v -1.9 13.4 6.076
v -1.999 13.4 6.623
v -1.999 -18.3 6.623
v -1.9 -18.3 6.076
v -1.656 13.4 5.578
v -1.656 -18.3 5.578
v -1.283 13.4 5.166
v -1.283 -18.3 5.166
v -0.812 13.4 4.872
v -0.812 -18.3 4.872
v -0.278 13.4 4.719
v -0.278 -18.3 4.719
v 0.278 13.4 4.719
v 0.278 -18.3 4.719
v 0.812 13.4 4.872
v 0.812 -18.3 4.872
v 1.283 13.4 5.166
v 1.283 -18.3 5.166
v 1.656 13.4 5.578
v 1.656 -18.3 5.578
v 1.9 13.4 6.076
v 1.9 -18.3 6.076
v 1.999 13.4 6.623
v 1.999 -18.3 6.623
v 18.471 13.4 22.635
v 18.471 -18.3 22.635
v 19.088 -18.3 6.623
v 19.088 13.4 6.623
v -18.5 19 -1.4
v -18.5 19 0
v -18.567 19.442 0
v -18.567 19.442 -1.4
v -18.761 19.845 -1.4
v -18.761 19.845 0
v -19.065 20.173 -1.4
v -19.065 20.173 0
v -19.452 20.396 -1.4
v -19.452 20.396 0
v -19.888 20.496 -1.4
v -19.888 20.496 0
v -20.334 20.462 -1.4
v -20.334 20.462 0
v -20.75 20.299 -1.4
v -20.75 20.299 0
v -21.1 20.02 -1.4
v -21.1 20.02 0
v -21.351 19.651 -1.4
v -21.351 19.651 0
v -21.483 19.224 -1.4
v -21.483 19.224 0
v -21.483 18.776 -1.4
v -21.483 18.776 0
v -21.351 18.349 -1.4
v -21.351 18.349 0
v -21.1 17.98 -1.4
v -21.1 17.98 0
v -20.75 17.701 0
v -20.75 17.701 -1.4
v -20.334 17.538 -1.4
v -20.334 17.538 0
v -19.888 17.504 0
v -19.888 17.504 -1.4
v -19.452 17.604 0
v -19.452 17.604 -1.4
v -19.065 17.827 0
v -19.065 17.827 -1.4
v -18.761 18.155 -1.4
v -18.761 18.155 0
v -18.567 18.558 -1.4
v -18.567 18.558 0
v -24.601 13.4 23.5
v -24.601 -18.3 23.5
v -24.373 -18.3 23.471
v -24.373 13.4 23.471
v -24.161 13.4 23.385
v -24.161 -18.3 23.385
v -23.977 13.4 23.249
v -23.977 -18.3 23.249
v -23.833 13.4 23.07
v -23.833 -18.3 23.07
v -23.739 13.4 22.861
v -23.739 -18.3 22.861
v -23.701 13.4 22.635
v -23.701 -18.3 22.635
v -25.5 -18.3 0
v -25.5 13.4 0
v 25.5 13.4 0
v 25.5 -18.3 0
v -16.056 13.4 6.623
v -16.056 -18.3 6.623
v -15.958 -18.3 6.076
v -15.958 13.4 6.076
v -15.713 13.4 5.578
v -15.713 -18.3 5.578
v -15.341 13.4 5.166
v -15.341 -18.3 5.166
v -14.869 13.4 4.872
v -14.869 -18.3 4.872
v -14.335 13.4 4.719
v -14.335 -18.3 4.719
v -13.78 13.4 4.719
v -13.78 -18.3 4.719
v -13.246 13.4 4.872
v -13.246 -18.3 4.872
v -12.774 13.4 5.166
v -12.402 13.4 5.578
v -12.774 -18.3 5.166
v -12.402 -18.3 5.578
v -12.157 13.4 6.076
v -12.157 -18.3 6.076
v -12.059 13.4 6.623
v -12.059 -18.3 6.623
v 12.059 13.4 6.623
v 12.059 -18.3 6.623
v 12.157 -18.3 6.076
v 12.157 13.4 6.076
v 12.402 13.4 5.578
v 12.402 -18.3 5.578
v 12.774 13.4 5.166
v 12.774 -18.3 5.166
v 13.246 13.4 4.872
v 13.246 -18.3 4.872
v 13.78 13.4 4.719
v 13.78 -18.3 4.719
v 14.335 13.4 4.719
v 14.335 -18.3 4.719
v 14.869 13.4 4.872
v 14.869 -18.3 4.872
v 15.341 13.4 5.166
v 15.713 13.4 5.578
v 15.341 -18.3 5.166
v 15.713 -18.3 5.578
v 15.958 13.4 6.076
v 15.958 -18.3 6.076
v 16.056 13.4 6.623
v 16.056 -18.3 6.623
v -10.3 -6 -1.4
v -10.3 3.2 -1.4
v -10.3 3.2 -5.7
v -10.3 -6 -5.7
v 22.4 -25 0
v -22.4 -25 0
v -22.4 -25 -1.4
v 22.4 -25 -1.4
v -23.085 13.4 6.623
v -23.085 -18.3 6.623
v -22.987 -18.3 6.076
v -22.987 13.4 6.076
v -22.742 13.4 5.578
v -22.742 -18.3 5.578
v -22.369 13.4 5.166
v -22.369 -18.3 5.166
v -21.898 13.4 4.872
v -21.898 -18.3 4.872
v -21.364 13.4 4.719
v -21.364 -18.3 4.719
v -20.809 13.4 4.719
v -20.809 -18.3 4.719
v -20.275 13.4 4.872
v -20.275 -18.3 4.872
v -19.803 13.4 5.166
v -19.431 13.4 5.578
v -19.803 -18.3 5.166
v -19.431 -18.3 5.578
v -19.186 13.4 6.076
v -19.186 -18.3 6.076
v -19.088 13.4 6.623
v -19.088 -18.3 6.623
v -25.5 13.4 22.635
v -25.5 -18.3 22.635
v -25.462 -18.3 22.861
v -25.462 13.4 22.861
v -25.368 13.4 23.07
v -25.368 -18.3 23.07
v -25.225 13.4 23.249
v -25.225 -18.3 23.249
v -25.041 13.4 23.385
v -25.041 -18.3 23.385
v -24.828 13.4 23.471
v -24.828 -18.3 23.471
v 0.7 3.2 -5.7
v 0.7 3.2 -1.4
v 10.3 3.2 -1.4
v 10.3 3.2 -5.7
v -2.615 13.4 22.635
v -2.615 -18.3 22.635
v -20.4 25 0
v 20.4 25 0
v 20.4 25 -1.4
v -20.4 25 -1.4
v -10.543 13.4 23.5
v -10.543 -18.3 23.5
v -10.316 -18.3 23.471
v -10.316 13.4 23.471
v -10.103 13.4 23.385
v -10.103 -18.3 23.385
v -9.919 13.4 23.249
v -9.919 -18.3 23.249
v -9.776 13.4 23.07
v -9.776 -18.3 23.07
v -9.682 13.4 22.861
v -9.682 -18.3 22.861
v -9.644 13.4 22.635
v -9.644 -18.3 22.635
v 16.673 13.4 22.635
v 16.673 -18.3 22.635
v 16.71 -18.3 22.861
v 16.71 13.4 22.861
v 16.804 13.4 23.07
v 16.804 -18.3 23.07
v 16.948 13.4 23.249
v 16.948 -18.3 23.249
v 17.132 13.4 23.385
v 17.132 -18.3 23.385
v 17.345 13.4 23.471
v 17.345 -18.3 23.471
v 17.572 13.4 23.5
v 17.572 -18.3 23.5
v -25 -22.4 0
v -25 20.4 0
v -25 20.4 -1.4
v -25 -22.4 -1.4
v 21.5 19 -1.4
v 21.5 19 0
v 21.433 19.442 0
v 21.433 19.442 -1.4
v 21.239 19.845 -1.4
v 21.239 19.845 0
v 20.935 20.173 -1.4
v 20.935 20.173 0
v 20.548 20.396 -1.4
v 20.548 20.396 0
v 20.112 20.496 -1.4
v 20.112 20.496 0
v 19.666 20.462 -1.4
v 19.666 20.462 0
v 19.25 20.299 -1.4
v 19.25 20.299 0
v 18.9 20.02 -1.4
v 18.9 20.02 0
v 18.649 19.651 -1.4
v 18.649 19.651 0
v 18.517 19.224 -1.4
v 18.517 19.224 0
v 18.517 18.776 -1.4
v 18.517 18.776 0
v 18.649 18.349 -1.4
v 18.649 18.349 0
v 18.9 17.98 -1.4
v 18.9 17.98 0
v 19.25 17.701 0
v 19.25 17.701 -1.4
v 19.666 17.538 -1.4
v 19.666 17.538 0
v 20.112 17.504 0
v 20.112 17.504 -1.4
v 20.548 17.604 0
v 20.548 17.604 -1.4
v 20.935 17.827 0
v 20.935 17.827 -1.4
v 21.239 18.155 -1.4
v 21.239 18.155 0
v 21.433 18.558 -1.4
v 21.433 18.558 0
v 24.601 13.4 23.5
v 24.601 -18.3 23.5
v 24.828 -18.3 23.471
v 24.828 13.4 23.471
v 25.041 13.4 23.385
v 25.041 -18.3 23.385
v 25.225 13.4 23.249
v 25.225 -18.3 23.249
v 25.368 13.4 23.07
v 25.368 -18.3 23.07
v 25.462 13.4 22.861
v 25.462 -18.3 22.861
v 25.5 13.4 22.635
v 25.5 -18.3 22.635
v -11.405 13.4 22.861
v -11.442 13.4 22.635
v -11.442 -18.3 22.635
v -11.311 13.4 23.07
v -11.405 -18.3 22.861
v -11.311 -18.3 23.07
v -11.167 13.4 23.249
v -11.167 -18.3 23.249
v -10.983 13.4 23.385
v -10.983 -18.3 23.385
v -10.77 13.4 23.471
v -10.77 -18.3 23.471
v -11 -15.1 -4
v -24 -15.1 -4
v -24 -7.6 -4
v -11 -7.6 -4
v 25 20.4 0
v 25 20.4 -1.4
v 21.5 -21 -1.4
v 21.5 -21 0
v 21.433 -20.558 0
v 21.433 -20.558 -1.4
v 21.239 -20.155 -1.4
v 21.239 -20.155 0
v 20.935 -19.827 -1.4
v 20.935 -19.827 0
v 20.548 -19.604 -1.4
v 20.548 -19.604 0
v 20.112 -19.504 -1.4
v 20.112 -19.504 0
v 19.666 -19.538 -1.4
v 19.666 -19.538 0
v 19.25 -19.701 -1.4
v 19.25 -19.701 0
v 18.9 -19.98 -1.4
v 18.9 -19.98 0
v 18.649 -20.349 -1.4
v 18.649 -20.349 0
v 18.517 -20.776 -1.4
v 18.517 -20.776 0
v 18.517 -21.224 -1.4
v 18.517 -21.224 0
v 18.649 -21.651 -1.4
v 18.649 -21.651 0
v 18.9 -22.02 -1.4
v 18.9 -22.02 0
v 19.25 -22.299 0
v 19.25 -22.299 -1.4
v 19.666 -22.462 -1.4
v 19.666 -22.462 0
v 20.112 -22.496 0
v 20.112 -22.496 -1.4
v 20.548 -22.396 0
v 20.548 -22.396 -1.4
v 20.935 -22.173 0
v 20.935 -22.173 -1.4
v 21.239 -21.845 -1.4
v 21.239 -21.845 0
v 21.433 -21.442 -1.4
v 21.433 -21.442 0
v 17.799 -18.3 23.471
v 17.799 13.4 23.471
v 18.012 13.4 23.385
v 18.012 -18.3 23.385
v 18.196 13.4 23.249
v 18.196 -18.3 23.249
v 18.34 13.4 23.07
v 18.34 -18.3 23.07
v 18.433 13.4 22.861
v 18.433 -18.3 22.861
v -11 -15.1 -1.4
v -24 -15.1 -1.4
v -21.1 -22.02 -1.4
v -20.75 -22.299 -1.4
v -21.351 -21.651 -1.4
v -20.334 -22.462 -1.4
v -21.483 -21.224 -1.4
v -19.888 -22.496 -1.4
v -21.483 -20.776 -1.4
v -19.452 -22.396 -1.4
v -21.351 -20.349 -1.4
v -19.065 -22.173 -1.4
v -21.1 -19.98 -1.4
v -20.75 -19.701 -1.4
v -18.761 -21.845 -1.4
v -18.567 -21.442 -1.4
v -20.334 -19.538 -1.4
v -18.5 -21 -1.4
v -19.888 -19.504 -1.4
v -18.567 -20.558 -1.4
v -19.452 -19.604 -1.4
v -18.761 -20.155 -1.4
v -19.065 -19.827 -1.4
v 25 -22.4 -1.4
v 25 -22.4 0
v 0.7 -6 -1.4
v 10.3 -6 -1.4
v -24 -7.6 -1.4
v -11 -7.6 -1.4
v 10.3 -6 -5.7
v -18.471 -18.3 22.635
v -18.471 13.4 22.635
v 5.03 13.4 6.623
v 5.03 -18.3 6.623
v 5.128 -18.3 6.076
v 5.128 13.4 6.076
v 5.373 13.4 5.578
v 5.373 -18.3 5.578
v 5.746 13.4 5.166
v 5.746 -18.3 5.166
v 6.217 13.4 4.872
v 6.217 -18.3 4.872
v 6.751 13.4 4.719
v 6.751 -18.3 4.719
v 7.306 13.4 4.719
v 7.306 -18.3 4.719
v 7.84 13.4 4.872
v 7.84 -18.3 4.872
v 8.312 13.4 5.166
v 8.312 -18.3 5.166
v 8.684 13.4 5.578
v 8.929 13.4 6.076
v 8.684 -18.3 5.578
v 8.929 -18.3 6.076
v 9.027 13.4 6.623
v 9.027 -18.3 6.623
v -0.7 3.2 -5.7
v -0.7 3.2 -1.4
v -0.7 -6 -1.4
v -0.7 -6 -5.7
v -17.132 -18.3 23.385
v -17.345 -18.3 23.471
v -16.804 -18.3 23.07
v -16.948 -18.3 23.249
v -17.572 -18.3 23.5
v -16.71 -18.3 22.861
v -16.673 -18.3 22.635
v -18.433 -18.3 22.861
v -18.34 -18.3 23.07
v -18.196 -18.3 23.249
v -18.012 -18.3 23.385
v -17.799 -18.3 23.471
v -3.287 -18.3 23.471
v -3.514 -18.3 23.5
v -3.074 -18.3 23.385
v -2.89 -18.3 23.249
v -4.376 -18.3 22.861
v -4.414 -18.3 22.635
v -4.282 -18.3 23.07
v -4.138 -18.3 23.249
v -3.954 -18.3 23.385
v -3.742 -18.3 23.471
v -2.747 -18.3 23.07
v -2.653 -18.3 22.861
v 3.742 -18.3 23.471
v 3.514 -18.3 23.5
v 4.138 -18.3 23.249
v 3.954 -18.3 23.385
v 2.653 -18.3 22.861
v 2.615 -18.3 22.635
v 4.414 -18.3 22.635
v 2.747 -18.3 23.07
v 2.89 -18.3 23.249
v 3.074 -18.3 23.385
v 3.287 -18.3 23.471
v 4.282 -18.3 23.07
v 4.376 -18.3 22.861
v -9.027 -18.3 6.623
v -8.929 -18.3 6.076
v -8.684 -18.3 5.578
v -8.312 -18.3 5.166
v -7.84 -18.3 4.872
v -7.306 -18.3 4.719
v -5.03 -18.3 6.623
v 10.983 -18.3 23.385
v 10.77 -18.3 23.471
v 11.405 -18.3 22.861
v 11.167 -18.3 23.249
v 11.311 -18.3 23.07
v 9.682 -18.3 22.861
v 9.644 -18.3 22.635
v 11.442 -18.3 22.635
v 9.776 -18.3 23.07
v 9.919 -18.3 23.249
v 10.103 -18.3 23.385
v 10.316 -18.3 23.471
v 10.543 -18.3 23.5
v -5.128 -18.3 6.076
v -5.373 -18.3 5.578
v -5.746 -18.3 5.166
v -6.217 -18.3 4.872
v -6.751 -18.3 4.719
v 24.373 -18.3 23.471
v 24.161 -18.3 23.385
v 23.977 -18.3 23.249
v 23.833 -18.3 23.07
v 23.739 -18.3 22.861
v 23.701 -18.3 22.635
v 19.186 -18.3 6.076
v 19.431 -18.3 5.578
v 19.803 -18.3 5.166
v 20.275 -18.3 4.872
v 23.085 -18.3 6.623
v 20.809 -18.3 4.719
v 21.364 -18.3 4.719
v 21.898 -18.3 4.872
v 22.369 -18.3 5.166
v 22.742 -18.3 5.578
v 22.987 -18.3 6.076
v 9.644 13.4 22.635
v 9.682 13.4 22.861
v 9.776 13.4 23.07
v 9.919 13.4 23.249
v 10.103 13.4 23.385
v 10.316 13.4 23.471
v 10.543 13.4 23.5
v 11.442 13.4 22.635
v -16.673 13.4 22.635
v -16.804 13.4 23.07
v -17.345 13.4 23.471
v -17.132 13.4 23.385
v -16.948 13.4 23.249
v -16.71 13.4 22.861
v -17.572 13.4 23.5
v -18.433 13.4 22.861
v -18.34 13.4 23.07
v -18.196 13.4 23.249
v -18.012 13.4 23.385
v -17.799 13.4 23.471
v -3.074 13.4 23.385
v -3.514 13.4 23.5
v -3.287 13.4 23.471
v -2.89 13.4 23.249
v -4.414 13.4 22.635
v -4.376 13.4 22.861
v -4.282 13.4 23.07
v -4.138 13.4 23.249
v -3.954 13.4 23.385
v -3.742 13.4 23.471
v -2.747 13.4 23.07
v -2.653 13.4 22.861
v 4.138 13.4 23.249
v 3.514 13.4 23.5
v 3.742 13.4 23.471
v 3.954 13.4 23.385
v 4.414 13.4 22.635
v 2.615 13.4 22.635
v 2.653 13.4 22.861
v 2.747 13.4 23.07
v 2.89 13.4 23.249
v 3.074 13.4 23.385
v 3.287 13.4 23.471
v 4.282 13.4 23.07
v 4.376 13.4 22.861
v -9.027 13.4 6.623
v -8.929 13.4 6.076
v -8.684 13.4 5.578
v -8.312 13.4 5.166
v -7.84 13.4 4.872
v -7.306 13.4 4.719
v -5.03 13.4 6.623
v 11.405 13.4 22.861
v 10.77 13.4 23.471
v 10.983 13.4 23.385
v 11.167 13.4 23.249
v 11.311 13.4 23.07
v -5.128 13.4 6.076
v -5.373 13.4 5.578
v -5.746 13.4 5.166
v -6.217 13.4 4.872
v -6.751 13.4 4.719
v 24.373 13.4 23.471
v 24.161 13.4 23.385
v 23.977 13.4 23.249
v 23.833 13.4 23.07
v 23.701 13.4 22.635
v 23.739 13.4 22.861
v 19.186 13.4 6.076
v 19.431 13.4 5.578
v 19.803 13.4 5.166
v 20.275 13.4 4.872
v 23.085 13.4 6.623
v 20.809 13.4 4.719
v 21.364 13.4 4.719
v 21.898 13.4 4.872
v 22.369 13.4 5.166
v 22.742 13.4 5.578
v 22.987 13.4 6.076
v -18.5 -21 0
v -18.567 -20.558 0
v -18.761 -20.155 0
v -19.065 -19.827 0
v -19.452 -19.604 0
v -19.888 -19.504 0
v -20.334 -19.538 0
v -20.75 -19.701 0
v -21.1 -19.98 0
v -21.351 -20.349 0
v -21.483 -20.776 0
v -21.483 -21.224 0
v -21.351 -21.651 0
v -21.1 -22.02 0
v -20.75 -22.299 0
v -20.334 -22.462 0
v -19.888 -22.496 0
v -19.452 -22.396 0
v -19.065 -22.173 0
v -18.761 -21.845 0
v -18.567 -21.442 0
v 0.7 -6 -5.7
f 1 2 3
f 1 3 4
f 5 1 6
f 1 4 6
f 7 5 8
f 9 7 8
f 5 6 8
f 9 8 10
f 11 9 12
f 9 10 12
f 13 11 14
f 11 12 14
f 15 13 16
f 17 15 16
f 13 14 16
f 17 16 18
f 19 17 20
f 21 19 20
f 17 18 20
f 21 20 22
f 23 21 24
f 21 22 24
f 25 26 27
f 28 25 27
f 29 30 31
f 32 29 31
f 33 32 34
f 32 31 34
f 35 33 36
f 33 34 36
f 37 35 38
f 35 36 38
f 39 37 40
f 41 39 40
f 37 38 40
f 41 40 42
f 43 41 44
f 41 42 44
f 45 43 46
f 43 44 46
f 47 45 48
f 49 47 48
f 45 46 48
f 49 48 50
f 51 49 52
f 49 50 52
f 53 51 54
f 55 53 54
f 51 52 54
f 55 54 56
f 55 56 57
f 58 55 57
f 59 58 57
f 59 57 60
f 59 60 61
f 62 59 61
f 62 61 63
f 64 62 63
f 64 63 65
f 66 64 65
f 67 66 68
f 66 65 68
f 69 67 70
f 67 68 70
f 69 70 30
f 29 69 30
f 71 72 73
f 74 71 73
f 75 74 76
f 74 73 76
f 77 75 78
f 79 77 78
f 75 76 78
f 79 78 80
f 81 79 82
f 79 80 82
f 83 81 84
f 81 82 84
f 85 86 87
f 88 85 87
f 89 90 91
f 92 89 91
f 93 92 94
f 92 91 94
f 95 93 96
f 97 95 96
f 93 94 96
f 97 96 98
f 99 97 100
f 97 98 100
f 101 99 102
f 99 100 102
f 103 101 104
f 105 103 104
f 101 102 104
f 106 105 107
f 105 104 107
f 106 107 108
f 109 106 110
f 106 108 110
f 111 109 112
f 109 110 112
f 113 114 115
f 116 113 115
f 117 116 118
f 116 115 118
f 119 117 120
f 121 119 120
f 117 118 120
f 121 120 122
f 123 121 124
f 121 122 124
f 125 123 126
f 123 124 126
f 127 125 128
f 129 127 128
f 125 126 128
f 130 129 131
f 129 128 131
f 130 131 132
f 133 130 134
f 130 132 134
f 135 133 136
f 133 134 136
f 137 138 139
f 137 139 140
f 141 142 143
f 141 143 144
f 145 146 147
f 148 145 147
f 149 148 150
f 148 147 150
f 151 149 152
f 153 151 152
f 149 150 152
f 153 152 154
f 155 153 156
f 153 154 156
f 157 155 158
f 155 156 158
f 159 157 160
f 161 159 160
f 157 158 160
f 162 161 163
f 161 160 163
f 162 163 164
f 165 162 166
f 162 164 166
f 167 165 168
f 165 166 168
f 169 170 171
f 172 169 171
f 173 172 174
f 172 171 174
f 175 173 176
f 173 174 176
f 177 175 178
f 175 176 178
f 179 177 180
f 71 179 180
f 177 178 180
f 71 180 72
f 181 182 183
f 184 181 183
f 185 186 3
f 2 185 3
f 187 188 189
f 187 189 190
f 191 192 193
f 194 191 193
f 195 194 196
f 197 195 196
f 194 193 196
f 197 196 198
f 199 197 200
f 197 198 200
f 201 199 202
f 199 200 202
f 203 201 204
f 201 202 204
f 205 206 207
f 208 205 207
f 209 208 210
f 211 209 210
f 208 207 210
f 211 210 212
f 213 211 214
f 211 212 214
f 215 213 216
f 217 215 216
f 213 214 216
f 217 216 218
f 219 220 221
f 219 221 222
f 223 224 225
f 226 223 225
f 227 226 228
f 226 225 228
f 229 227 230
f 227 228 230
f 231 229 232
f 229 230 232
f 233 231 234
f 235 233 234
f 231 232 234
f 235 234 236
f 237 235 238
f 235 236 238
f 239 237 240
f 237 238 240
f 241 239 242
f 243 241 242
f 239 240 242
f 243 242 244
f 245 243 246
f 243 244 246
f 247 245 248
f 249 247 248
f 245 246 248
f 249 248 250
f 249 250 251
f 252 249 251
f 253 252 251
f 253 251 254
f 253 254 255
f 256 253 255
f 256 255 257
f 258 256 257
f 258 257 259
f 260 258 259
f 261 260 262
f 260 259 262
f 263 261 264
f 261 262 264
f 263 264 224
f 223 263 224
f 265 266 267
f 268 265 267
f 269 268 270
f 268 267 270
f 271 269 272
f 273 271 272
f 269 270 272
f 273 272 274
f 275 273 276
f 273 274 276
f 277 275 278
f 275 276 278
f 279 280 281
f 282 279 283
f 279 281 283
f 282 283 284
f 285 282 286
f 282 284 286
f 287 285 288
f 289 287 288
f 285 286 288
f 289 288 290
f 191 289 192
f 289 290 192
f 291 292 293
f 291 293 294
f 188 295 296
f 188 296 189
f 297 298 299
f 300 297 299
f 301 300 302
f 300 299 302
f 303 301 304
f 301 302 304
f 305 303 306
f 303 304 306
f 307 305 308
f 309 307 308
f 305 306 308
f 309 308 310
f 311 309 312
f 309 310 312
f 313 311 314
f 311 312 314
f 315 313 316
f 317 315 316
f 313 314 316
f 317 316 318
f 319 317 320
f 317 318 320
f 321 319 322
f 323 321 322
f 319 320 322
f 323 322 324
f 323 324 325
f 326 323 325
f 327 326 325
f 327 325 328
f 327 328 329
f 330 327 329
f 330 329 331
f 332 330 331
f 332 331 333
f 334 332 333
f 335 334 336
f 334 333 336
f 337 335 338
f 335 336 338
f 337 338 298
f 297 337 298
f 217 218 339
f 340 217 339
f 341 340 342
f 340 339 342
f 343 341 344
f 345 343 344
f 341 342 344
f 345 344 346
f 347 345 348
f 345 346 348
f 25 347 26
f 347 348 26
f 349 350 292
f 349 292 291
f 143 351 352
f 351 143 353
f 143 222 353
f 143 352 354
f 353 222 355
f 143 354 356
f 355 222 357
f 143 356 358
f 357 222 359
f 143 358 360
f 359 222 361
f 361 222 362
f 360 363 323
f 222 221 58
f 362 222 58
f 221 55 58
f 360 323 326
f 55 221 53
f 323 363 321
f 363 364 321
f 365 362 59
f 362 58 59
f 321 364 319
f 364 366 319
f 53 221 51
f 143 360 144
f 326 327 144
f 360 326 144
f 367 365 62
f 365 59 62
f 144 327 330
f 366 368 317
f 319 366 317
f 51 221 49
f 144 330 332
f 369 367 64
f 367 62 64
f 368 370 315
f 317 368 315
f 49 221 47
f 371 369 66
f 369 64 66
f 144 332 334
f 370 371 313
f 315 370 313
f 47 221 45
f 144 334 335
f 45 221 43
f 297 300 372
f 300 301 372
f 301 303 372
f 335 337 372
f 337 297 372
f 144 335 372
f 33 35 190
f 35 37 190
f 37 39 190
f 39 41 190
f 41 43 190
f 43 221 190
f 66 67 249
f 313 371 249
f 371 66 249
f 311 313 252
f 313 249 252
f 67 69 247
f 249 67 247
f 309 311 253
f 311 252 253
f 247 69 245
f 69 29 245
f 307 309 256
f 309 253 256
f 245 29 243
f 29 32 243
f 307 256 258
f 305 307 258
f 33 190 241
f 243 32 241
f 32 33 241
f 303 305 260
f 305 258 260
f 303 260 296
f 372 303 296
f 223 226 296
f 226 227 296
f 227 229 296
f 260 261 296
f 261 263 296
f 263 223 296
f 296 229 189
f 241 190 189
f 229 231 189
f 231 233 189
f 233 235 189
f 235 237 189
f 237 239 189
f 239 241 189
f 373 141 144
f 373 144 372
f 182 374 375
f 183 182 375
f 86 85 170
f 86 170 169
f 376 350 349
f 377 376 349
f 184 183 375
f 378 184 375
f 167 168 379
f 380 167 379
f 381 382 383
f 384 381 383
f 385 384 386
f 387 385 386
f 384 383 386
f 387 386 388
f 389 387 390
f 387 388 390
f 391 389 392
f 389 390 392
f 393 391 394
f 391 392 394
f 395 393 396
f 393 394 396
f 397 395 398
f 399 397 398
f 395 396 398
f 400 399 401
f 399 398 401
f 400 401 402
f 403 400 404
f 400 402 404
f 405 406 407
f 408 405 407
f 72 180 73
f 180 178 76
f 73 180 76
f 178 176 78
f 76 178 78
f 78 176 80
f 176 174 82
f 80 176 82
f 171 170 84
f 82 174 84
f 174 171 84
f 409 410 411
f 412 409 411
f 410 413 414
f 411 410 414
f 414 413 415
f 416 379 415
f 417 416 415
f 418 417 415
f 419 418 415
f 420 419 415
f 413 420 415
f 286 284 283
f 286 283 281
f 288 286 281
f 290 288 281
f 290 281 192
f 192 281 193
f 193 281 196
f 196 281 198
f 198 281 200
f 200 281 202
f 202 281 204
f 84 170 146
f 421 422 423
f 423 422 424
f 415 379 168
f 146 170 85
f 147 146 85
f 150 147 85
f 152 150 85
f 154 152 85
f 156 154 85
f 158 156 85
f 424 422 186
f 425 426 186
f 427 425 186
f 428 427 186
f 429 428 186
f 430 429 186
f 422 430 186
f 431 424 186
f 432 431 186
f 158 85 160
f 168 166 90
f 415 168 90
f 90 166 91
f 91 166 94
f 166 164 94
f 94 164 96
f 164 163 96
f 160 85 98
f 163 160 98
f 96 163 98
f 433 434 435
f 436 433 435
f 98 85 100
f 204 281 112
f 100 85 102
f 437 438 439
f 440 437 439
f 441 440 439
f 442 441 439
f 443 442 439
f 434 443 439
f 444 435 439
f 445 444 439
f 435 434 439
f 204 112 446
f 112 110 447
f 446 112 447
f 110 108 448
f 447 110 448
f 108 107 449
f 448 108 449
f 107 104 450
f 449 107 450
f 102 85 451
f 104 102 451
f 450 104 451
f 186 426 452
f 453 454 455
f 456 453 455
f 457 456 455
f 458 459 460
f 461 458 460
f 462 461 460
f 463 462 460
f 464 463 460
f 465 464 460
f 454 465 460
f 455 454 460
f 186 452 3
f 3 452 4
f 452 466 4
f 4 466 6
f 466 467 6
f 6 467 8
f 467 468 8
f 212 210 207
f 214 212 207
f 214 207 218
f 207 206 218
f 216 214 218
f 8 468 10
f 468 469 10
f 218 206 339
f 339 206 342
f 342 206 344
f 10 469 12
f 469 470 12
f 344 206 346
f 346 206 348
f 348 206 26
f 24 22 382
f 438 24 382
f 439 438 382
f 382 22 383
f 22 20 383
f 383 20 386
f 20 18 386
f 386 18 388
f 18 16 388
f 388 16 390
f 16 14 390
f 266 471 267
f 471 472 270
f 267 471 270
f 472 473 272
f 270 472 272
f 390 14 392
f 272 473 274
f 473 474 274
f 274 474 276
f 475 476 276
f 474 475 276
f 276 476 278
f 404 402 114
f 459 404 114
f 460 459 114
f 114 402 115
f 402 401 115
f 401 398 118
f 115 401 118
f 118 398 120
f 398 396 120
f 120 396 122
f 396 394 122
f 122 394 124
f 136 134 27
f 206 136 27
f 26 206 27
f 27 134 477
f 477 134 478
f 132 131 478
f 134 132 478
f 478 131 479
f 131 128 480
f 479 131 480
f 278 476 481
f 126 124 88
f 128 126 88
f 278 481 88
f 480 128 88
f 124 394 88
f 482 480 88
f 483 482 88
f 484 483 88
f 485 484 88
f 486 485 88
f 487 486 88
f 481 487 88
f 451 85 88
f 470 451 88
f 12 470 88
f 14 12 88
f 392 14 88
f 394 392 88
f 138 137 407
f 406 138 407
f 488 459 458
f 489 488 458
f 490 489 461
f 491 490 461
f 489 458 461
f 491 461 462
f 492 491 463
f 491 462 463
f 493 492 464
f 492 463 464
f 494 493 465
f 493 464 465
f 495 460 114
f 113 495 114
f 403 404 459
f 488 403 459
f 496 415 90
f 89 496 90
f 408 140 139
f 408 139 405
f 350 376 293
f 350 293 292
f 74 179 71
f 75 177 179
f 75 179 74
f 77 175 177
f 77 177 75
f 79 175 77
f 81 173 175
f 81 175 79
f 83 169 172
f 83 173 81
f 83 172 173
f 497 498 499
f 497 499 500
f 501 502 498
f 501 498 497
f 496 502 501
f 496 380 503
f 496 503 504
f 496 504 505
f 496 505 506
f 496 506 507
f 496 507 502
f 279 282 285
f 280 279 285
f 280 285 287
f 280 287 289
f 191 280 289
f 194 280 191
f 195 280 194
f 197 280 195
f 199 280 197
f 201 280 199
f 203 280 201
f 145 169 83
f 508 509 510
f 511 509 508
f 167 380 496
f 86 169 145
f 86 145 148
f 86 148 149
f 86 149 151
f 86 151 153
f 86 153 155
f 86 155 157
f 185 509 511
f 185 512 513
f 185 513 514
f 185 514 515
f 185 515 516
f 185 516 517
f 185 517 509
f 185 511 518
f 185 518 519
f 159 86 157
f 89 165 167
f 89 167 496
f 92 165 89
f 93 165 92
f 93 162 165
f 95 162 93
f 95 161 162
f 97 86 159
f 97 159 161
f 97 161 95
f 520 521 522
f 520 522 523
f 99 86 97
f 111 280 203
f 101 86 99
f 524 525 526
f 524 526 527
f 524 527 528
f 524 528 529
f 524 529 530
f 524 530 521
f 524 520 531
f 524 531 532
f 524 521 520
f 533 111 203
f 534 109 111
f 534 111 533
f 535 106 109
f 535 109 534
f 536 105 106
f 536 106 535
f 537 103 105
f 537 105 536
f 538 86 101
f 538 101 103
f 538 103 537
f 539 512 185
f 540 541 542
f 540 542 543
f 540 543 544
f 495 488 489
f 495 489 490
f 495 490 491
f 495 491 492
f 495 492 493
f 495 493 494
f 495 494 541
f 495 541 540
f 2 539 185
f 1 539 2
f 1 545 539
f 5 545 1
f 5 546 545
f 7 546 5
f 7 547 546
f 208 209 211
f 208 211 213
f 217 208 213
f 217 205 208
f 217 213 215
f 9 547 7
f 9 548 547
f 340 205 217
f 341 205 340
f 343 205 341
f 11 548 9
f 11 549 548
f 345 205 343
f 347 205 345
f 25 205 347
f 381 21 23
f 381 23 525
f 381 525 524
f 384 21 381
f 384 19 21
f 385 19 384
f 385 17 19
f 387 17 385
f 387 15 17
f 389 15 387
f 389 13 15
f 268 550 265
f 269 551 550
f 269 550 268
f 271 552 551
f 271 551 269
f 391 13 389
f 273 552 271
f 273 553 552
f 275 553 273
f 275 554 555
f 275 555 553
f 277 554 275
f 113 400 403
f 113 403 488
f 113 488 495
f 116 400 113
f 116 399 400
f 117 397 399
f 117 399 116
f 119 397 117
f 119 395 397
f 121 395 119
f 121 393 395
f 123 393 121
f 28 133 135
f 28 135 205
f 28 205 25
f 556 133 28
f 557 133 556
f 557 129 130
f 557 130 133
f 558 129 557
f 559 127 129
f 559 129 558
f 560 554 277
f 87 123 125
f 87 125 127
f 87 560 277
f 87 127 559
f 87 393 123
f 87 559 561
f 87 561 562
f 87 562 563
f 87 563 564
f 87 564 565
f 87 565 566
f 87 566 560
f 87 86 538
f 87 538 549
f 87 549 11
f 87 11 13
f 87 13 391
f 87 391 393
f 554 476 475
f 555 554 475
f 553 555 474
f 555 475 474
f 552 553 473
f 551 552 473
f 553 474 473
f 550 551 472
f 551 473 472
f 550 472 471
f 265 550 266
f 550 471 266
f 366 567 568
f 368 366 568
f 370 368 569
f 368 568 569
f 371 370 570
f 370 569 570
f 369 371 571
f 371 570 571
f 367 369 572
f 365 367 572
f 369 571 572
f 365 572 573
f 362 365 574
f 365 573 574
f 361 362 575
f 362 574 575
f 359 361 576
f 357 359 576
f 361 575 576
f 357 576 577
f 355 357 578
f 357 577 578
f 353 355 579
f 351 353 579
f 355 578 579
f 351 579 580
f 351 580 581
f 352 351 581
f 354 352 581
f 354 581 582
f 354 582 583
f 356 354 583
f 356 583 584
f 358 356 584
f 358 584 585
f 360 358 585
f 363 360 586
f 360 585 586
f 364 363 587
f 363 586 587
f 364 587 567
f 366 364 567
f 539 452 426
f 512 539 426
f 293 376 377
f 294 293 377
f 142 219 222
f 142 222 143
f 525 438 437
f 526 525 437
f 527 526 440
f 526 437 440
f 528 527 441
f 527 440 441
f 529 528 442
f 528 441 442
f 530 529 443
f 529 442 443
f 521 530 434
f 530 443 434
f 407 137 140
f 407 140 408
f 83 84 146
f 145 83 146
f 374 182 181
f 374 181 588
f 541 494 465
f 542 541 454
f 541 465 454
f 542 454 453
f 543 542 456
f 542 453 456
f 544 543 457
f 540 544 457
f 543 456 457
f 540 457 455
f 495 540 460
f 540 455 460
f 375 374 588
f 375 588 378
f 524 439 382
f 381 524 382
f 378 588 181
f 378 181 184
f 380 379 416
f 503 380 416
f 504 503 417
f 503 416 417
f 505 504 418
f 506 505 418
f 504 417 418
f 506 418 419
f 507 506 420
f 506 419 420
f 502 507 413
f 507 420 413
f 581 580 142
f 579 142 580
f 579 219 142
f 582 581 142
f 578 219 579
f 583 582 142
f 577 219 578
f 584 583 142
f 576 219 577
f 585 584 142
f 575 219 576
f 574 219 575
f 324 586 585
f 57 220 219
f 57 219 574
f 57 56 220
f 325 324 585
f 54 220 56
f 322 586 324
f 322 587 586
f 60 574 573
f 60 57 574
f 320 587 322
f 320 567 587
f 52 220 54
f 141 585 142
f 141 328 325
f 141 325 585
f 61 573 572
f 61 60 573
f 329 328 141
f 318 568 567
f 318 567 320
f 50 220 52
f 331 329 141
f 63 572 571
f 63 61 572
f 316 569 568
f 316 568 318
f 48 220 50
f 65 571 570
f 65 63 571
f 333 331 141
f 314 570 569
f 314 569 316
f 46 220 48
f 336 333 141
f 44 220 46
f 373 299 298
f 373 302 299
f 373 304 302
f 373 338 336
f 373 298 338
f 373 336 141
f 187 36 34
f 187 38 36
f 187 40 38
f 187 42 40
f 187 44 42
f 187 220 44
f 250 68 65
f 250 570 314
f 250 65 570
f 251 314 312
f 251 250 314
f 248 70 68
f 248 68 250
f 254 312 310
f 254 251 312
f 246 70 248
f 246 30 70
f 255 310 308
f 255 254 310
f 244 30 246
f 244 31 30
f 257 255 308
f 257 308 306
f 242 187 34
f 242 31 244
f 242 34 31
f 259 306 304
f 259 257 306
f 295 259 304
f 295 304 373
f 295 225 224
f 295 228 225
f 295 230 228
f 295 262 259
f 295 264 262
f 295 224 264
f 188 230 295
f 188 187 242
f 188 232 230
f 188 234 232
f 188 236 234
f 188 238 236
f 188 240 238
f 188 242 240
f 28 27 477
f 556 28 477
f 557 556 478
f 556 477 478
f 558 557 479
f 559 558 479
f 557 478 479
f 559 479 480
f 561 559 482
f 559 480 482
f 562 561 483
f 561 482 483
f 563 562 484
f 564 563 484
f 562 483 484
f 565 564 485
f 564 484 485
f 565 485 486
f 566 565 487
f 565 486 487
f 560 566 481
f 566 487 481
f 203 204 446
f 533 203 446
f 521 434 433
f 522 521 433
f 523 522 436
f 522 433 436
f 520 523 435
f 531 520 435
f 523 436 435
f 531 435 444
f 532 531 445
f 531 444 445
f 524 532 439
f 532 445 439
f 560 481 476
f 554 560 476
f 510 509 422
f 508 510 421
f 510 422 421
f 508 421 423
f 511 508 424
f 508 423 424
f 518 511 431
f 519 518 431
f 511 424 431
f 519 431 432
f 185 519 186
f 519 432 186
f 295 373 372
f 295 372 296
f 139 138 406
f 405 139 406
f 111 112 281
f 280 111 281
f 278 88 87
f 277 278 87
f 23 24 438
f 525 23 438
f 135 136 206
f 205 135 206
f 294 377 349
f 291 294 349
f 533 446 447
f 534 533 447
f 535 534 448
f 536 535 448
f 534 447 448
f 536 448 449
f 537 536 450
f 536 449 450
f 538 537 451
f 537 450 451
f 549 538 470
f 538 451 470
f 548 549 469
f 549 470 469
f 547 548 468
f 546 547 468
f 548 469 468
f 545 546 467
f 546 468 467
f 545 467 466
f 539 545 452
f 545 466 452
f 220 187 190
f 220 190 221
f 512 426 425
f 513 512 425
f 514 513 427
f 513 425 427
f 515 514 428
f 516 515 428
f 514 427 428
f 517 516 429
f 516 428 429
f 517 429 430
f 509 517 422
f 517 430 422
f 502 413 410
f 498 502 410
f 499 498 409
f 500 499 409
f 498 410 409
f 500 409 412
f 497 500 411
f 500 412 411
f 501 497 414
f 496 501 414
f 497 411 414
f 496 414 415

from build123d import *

# Parameters (mm, degrees)
F0_R     = 1.5
F1_DEPTH = 1.4
F2_W     = 51
F2_H     = 31.7
F3_DEPTH = 23.5
F5_DEPTH = 31.7
F6_W     = 9.6
F6_H     = 9.2
F7_DEPTH = 4.3
F6_W_2   = 13
F6_H_2   = 7.5
F8_DEPTH = 2.6


with BuildPart() as f1:
    # F0 (on Top) → F1 (new body)
    with BuildSketch(Plane.XY):
        Polygon((-25, -22.4), (-22.4, -25), (22.4, -25), (25, -22.4), (25, 20.4), (20.4, 25), (-20.4, 25), (-25, 20.4), align=None)
        with Locations((-20, -21)):
            Circle(F0_R, mode=Mode.SUBTRACT)
        with Locations((20, -21)):
            Circle(F0_R, mode=Mode.SUBTRACT)
        with Locations((-20, 19)):
            Circle(F0_R, mode=Mode.SUBTRACT)
        with Locations((20, 19)):
            Circle(F0_R, mode=Mode.SUBTRACT)
    extrude(amount=-F1_DEPTH)


with BuildPart() as f3:
    # F2 (on face) → F3 (new body)
    with BuildSketch(Plane.XY):
        with Locations((0, -2.45)):
            Rectangle(F2_W, F2_H)
    extrude(amount=F3_DEPTH)

    # F4 (on face) → F5 (cut, through all)
    with BuildSketch(Plane.XZ.offset(18.3)):
        with BuildLine():
            ThreePointArc((-18.4712381572, 22.634628973), (-18.1959374285, 23.2485237373), (-17.5719046071, 23.5))
            Line((-17.5719046071, 23.5), (-24.600666458, 23.5))
            ThreePointArc((-24.600666458, 23.5), (-23.9766336315, 23.2485237401), (-23.7013328999, 22.634628973))
            Line((-23.7013328999, 22.634628973), (-23.0848045286, 6.6230467267))
            ThreePointArc((-23.0848045286, 6.6230467267), (-21.0862855285, 4.7), (-19.0877665284, 6.6230467267))
            Line((-19.0877665284, 6.6230467267), (-18.4712381572, 22.634628973))
        make_face()
        with BuildLine():
            ThreePointArc((-11.4424763143, 22.634628973), (-11.1671755857, 23.2485237373), (-10.5431427643, 23.5))
            Line((-10.5431427643, 23.5), (-17.5719046071, 23.5))
            ThreePointArc((-17.5719046071, 23.5), (-16.9478717857, 23.2485237373), (-16.6725710571, 22.634628973))
            Line((-16.6725710571, 22.634628973), (-16.0560426858, 6.6230467267))
            ThreePointArc((-16.0560426858, 6.6230467267), (-14.0575236857, 4.7), (-12.0590046856, 6.6230467267))
            Line((-12.0590046856, 6.6230467267), (-11.4424763143, 22.634628973))
        make_face()
        with BuildLine():
            ThreePointArc((-4.4137144715, 22.634628973), (-4.1384137428, 23.2485237373), (-3.5143809214, 23.5))
            Line((-3.5143809214, 23.5), (-10.5431427643, 23.5))
            ThreePointArc((-10.5431427643, 23.5), (-9.9191099429, 23.2485237373), (-9.6438092142, 22.634628973))
            Line((-9.6438092142, 22.634628973), (-9.0272808429, 6.6230467267))
            ThreePointArc((-9.0272808429, 6.6230467267), (-7.0287618428, 4.7), (-5.0302428428, 6.6230467267))
            Line((-5.0302428428, 6.6230467267), (-4.4137144715, 22.634628973))
        make_face()
        with BuildLine():
            ThreePointArc((-3.5143809214, 23.5), (-2.8903481, 23.2485237373), (-2.6150473714, 22.634628973))
            Line((-2.6150473714, 22.634628973), (-1.998519, 6.6230467267))
            ThreePointArc((-1.998519, 6.6230467267), (0, 4.7), (1.998519, 6.6230467267))
            Line((1.998519, 6.6230467267), (2.6150473714, 22.634628973))
            ThreePointArc((2.6150473714, 22.634628973), (2.8903481055, 23.2485237425), (3.5143809365, 23.5))
            Line((3.5143809365, 23.5), (-3.5143809214, 23.5))
        make_face()
        with BuildLine():
            Line((10.5431427643, 23.5), (3.5143809365, 23.5))
            ThreePointArc((3.5143809365, 23.5), (4.1384137483, 23.2485237321), (4.4137144715, 22.634628973))
            Line((4.4137144715, 22.634628973), (5.0302428428, 6.6230467267))
            ThreePointArc((5.0302428428, 6.6230467267), (7.0287618428, 4.7), (9.0272808429, 6.6230467267))
            Line((9.0272808429, 6.6230467267), (9.6438092142, 22.634628973))
            ThreePointArc((9.6438092142, 22.634628973), (9.9191099429, 23.2485237373), (10.5431427643, 23.5))
        make_face()
        with BuildLine():
            Line((17.5719046071, 23.5), (10.5431427643, 23.5))
            ThreePointArc((10.5431427643, 23.5), (11.1671755857, 23.2485237373), (11.4424763143, 22.634628973))
            Line((11.4424763143, 22.634628973), (12.0590046856, 6.6230467267))
            ThreePointArc((12.0590046856, 6.6230467267), (14.0575236857, 4.7), (16.0560426858, 6.6230467267))
            Line((16.0560426858, 6.6230467267), (16.6725710571, 22.634628973))
            ThreePointArc((16.6725710571, 22.634628973), (16.9478717857, 23.2485237373), (17.5719046071, 23.5))
        make_face()
        with BuildLine():
            Line((24.60066645, 23.5), (17.5719046071, 23.5))
            ThreePointArc((17.5719046071, 23.5), (18.1959374285, 23.2485237373), (18.4712381572, 22.634628973))
            Line((18.4712381572, 22.634628973), (19.0877665284, 6.6230467267))
            ThreePointArc((19.0877665284, 6.6230467267), (21.0862855285, 4.7), (23.0848045286, 6.6230467267))
            Line((23.0848045286, 6.6230467267), (23.7013328999, 22.634628973))
            ThreePointArc((23.7013328999, 22.634628973), (23.9766336286, 23.2485237373), (24.60066645, 23.5))
        make_face()
        with BuildLine():
            Line((25.5, 23.5), (24.60066645, 23.5))
            ThreePointArc((24.60066645, 23.5), (25.2246992713, 23.2485237373), (25.5, 22.634628973))
            Line((25.5, 22.634628973), (25.5, 23.5))
        make_face()
        with BuildLine():
            ThreePointArc((-25.5, 22.634628973), (-25.2246992742, 23.2485237345), (-24.600666458, 23.5))
            Line((-24.600666458, 23.5), (-25.5, 23.5))
            Line((-25.5, 23.5), (-25.5, 22.634628973))
        make_face()
    extrude(amount=-F5_DEPTH, mode=Mode.SUBTRACT)


with BuildPart() as f7:
    # F6 (on face) → F7 (new body)
    with BuildSketch(Plane(origin=(0, 0, -1.4), x_dir=(1, 0, 0), z_dir=(0, 0, -1))):
        with Locations((5.5, 1.4)):
            Rectangle(F6_W, F6_H)
    extrude(amount=F7_DEPTH)


with BuildPart() as f7b:
    # F6 (on face) → F7, piece 2 (new body)
    with BuildSketch(Plane(origin=(0, 0, -1.4), x_dir=(1, 0, 0), z_dir=(0, 0, -1))):
        with Locations((-5.5, 1.4)):
            Rectangle(F6_W, F6_H)
    extrude(amount=F7_DEPTH)


with BuildPart() as f8:
    # F6 (on face) → F8 (new body)
    with BuildSketch(Plane(origin=(0, 0, -1.4), x_dir=(1, 0, 0), z_dir=(0, 0, -1))):
        with Locations((-17.5, 11.35)):
            Rectangle(F6_W_2, F6_H_2)
    extrude(amount=F8_DEPTH)


solid = Compound([f1.part, f3.part, f7.part, f7b.part, f8.part])
